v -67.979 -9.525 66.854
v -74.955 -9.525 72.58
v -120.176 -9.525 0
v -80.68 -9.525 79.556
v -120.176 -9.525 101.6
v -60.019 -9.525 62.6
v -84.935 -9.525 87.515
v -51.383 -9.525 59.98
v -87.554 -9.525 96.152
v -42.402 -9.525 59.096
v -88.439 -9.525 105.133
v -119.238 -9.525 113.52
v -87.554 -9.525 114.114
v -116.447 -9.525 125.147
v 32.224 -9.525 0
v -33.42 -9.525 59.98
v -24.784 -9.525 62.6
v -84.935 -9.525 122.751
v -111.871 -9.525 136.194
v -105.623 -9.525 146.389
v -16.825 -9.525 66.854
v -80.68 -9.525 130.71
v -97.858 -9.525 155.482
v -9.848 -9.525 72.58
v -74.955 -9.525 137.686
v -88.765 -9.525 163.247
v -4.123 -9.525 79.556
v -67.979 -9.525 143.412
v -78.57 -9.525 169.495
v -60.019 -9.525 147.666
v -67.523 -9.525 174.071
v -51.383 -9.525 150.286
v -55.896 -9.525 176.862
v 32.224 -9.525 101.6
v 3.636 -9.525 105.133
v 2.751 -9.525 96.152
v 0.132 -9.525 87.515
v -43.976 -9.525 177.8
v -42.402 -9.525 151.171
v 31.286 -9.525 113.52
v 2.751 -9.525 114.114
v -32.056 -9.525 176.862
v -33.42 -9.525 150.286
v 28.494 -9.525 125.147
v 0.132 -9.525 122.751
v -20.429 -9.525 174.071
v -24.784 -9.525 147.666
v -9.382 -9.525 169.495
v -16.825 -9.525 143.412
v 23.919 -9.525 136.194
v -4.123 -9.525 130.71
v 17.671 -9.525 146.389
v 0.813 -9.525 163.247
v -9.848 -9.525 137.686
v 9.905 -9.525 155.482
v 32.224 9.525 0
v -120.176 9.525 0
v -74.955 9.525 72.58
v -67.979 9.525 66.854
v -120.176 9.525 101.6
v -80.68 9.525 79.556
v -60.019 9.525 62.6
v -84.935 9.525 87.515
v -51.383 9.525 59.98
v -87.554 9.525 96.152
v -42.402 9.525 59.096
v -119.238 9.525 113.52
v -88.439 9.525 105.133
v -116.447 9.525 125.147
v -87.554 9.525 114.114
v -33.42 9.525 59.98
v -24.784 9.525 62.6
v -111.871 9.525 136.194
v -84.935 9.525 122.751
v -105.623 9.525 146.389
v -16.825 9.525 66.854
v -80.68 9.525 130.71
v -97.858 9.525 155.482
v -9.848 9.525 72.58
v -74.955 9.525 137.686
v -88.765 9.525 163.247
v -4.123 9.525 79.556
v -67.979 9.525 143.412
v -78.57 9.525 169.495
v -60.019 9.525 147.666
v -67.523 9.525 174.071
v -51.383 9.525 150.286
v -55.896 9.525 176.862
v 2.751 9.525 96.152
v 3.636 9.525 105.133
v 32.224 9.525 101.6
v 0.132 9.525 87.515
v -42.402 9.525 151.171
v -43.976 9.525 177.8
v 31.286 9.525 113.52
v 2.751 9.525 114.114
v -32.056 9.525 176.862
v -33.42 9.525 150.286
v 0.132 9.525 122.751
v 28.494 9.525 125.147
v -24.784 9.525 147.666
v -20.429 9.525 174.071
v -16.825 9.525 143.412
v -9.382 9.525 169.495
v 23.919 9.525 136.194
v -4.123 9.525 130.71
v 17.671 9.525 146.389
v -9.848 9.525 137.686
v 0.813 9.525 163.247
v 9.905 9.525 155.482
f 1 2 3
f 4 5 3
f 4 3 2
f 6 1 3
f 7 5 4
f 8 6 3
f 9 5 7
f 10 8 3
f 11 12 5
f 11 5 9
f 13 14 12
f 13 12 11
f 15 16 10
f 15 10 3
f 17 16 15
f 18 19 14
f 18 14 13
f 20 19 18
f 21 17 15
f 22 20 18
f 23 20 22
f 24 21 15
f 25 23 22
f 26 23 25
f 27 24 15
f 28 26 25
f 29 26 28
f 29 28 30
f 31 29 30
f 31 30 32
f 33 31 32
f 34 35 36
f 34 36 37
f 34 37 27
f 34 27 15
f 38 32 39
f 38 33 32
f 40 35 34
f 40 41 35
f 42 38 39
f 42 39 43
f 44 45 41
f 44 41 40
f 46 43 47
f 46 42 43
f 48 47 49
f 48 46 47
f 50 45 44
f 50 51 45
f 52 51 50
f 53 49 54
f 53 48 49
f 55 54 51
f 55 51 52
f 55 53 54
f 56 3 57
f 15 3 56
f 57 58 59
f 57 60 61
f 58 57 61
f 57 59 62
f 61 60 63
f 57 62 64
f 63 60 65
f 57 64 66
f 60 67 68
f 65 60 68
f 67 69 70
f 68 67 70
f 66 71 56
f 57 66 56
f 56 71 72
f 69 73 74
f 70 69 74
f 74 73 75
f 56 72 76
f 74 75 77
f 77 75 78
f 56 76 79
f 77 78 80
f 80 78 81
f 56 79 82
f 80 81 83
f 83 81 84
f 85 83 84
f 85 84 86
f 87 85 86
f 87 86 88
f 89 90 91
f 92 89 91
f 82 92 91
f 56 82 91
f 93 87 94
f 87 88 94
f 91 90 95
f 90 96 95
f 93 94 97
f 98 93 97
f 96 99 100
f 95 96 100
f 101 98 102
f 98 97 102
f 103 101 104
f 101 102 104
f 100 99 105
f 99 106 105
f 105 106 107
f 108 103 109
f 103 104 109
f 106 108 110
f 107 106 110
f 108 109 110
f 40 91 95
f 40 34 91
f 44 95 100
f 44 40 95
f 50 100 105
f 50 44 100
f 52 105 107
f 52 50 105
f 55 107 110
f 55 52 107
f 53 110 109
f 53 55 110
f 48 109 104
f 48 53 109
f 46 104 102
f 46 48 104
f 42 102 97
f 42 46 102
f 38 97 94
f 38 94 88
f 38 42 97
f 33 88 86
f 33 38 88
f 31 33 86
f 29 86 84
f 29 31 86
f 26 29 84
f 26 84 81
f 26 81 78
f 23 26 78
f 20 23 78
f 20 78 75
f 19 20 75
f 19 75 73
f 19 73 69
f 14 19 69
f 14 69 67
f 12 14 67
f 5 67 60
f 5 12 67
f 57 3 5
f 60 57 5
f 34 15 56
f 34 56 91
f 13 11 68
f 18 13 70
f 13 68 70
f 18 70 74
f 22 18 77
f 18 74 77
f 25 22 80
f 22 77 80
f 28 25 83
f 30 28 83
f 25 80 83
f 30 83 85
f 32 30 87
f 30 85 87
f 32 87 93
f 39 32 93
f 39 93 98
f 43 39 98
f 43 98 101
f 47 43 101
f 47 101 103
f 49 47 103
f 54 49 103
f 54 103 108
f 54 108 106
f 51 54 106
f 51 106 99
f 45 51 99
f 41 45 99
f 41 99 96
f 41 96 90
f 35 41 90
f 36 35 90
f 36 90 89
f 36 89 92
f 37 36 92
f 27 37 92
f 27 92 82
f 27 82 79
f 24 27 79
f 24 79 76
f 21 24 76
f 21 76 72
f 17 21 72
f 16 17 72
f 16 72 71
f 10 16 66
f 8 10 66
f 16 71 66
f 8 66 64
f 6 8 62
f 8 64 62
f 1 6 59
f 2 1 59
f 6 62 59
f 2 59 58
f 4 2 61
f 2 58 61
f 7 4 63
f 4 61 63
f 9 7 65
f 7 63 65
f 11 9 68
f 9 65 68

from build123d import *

# Parameters (mm, degrees)
F0_W     = 152.4
F0_H     = 101.6
F2_DEPTH = 9.525
F4_D     = 92.075


with BuildPart() as f2:
    # F0 (on Front) → F2 (new body, symmetric)
    with BuildSketch(Plane.XZ):
        with Locations((-43.9761151315, 50.8)):
            Rectangle(F0_W, F0_H)
        with BuildLine():
            Line((-120.1761151315, 101.6), (32.2238848685, 101.6))
            ThreePointArc((32.2238848685, 101.6), (-43.9761151315, 177.8), (-120.1761151315, 101.6))
        make_face()
    extrude(amount=F2_DEPTH, both=True)

    # F4 (through all)
    with Locations(Plane.XZ.offset(25.4)):
        with Locations((-42.4015931785, 105.1330193877)):
            Hole(F4_D / 2)


solid = f2.part
